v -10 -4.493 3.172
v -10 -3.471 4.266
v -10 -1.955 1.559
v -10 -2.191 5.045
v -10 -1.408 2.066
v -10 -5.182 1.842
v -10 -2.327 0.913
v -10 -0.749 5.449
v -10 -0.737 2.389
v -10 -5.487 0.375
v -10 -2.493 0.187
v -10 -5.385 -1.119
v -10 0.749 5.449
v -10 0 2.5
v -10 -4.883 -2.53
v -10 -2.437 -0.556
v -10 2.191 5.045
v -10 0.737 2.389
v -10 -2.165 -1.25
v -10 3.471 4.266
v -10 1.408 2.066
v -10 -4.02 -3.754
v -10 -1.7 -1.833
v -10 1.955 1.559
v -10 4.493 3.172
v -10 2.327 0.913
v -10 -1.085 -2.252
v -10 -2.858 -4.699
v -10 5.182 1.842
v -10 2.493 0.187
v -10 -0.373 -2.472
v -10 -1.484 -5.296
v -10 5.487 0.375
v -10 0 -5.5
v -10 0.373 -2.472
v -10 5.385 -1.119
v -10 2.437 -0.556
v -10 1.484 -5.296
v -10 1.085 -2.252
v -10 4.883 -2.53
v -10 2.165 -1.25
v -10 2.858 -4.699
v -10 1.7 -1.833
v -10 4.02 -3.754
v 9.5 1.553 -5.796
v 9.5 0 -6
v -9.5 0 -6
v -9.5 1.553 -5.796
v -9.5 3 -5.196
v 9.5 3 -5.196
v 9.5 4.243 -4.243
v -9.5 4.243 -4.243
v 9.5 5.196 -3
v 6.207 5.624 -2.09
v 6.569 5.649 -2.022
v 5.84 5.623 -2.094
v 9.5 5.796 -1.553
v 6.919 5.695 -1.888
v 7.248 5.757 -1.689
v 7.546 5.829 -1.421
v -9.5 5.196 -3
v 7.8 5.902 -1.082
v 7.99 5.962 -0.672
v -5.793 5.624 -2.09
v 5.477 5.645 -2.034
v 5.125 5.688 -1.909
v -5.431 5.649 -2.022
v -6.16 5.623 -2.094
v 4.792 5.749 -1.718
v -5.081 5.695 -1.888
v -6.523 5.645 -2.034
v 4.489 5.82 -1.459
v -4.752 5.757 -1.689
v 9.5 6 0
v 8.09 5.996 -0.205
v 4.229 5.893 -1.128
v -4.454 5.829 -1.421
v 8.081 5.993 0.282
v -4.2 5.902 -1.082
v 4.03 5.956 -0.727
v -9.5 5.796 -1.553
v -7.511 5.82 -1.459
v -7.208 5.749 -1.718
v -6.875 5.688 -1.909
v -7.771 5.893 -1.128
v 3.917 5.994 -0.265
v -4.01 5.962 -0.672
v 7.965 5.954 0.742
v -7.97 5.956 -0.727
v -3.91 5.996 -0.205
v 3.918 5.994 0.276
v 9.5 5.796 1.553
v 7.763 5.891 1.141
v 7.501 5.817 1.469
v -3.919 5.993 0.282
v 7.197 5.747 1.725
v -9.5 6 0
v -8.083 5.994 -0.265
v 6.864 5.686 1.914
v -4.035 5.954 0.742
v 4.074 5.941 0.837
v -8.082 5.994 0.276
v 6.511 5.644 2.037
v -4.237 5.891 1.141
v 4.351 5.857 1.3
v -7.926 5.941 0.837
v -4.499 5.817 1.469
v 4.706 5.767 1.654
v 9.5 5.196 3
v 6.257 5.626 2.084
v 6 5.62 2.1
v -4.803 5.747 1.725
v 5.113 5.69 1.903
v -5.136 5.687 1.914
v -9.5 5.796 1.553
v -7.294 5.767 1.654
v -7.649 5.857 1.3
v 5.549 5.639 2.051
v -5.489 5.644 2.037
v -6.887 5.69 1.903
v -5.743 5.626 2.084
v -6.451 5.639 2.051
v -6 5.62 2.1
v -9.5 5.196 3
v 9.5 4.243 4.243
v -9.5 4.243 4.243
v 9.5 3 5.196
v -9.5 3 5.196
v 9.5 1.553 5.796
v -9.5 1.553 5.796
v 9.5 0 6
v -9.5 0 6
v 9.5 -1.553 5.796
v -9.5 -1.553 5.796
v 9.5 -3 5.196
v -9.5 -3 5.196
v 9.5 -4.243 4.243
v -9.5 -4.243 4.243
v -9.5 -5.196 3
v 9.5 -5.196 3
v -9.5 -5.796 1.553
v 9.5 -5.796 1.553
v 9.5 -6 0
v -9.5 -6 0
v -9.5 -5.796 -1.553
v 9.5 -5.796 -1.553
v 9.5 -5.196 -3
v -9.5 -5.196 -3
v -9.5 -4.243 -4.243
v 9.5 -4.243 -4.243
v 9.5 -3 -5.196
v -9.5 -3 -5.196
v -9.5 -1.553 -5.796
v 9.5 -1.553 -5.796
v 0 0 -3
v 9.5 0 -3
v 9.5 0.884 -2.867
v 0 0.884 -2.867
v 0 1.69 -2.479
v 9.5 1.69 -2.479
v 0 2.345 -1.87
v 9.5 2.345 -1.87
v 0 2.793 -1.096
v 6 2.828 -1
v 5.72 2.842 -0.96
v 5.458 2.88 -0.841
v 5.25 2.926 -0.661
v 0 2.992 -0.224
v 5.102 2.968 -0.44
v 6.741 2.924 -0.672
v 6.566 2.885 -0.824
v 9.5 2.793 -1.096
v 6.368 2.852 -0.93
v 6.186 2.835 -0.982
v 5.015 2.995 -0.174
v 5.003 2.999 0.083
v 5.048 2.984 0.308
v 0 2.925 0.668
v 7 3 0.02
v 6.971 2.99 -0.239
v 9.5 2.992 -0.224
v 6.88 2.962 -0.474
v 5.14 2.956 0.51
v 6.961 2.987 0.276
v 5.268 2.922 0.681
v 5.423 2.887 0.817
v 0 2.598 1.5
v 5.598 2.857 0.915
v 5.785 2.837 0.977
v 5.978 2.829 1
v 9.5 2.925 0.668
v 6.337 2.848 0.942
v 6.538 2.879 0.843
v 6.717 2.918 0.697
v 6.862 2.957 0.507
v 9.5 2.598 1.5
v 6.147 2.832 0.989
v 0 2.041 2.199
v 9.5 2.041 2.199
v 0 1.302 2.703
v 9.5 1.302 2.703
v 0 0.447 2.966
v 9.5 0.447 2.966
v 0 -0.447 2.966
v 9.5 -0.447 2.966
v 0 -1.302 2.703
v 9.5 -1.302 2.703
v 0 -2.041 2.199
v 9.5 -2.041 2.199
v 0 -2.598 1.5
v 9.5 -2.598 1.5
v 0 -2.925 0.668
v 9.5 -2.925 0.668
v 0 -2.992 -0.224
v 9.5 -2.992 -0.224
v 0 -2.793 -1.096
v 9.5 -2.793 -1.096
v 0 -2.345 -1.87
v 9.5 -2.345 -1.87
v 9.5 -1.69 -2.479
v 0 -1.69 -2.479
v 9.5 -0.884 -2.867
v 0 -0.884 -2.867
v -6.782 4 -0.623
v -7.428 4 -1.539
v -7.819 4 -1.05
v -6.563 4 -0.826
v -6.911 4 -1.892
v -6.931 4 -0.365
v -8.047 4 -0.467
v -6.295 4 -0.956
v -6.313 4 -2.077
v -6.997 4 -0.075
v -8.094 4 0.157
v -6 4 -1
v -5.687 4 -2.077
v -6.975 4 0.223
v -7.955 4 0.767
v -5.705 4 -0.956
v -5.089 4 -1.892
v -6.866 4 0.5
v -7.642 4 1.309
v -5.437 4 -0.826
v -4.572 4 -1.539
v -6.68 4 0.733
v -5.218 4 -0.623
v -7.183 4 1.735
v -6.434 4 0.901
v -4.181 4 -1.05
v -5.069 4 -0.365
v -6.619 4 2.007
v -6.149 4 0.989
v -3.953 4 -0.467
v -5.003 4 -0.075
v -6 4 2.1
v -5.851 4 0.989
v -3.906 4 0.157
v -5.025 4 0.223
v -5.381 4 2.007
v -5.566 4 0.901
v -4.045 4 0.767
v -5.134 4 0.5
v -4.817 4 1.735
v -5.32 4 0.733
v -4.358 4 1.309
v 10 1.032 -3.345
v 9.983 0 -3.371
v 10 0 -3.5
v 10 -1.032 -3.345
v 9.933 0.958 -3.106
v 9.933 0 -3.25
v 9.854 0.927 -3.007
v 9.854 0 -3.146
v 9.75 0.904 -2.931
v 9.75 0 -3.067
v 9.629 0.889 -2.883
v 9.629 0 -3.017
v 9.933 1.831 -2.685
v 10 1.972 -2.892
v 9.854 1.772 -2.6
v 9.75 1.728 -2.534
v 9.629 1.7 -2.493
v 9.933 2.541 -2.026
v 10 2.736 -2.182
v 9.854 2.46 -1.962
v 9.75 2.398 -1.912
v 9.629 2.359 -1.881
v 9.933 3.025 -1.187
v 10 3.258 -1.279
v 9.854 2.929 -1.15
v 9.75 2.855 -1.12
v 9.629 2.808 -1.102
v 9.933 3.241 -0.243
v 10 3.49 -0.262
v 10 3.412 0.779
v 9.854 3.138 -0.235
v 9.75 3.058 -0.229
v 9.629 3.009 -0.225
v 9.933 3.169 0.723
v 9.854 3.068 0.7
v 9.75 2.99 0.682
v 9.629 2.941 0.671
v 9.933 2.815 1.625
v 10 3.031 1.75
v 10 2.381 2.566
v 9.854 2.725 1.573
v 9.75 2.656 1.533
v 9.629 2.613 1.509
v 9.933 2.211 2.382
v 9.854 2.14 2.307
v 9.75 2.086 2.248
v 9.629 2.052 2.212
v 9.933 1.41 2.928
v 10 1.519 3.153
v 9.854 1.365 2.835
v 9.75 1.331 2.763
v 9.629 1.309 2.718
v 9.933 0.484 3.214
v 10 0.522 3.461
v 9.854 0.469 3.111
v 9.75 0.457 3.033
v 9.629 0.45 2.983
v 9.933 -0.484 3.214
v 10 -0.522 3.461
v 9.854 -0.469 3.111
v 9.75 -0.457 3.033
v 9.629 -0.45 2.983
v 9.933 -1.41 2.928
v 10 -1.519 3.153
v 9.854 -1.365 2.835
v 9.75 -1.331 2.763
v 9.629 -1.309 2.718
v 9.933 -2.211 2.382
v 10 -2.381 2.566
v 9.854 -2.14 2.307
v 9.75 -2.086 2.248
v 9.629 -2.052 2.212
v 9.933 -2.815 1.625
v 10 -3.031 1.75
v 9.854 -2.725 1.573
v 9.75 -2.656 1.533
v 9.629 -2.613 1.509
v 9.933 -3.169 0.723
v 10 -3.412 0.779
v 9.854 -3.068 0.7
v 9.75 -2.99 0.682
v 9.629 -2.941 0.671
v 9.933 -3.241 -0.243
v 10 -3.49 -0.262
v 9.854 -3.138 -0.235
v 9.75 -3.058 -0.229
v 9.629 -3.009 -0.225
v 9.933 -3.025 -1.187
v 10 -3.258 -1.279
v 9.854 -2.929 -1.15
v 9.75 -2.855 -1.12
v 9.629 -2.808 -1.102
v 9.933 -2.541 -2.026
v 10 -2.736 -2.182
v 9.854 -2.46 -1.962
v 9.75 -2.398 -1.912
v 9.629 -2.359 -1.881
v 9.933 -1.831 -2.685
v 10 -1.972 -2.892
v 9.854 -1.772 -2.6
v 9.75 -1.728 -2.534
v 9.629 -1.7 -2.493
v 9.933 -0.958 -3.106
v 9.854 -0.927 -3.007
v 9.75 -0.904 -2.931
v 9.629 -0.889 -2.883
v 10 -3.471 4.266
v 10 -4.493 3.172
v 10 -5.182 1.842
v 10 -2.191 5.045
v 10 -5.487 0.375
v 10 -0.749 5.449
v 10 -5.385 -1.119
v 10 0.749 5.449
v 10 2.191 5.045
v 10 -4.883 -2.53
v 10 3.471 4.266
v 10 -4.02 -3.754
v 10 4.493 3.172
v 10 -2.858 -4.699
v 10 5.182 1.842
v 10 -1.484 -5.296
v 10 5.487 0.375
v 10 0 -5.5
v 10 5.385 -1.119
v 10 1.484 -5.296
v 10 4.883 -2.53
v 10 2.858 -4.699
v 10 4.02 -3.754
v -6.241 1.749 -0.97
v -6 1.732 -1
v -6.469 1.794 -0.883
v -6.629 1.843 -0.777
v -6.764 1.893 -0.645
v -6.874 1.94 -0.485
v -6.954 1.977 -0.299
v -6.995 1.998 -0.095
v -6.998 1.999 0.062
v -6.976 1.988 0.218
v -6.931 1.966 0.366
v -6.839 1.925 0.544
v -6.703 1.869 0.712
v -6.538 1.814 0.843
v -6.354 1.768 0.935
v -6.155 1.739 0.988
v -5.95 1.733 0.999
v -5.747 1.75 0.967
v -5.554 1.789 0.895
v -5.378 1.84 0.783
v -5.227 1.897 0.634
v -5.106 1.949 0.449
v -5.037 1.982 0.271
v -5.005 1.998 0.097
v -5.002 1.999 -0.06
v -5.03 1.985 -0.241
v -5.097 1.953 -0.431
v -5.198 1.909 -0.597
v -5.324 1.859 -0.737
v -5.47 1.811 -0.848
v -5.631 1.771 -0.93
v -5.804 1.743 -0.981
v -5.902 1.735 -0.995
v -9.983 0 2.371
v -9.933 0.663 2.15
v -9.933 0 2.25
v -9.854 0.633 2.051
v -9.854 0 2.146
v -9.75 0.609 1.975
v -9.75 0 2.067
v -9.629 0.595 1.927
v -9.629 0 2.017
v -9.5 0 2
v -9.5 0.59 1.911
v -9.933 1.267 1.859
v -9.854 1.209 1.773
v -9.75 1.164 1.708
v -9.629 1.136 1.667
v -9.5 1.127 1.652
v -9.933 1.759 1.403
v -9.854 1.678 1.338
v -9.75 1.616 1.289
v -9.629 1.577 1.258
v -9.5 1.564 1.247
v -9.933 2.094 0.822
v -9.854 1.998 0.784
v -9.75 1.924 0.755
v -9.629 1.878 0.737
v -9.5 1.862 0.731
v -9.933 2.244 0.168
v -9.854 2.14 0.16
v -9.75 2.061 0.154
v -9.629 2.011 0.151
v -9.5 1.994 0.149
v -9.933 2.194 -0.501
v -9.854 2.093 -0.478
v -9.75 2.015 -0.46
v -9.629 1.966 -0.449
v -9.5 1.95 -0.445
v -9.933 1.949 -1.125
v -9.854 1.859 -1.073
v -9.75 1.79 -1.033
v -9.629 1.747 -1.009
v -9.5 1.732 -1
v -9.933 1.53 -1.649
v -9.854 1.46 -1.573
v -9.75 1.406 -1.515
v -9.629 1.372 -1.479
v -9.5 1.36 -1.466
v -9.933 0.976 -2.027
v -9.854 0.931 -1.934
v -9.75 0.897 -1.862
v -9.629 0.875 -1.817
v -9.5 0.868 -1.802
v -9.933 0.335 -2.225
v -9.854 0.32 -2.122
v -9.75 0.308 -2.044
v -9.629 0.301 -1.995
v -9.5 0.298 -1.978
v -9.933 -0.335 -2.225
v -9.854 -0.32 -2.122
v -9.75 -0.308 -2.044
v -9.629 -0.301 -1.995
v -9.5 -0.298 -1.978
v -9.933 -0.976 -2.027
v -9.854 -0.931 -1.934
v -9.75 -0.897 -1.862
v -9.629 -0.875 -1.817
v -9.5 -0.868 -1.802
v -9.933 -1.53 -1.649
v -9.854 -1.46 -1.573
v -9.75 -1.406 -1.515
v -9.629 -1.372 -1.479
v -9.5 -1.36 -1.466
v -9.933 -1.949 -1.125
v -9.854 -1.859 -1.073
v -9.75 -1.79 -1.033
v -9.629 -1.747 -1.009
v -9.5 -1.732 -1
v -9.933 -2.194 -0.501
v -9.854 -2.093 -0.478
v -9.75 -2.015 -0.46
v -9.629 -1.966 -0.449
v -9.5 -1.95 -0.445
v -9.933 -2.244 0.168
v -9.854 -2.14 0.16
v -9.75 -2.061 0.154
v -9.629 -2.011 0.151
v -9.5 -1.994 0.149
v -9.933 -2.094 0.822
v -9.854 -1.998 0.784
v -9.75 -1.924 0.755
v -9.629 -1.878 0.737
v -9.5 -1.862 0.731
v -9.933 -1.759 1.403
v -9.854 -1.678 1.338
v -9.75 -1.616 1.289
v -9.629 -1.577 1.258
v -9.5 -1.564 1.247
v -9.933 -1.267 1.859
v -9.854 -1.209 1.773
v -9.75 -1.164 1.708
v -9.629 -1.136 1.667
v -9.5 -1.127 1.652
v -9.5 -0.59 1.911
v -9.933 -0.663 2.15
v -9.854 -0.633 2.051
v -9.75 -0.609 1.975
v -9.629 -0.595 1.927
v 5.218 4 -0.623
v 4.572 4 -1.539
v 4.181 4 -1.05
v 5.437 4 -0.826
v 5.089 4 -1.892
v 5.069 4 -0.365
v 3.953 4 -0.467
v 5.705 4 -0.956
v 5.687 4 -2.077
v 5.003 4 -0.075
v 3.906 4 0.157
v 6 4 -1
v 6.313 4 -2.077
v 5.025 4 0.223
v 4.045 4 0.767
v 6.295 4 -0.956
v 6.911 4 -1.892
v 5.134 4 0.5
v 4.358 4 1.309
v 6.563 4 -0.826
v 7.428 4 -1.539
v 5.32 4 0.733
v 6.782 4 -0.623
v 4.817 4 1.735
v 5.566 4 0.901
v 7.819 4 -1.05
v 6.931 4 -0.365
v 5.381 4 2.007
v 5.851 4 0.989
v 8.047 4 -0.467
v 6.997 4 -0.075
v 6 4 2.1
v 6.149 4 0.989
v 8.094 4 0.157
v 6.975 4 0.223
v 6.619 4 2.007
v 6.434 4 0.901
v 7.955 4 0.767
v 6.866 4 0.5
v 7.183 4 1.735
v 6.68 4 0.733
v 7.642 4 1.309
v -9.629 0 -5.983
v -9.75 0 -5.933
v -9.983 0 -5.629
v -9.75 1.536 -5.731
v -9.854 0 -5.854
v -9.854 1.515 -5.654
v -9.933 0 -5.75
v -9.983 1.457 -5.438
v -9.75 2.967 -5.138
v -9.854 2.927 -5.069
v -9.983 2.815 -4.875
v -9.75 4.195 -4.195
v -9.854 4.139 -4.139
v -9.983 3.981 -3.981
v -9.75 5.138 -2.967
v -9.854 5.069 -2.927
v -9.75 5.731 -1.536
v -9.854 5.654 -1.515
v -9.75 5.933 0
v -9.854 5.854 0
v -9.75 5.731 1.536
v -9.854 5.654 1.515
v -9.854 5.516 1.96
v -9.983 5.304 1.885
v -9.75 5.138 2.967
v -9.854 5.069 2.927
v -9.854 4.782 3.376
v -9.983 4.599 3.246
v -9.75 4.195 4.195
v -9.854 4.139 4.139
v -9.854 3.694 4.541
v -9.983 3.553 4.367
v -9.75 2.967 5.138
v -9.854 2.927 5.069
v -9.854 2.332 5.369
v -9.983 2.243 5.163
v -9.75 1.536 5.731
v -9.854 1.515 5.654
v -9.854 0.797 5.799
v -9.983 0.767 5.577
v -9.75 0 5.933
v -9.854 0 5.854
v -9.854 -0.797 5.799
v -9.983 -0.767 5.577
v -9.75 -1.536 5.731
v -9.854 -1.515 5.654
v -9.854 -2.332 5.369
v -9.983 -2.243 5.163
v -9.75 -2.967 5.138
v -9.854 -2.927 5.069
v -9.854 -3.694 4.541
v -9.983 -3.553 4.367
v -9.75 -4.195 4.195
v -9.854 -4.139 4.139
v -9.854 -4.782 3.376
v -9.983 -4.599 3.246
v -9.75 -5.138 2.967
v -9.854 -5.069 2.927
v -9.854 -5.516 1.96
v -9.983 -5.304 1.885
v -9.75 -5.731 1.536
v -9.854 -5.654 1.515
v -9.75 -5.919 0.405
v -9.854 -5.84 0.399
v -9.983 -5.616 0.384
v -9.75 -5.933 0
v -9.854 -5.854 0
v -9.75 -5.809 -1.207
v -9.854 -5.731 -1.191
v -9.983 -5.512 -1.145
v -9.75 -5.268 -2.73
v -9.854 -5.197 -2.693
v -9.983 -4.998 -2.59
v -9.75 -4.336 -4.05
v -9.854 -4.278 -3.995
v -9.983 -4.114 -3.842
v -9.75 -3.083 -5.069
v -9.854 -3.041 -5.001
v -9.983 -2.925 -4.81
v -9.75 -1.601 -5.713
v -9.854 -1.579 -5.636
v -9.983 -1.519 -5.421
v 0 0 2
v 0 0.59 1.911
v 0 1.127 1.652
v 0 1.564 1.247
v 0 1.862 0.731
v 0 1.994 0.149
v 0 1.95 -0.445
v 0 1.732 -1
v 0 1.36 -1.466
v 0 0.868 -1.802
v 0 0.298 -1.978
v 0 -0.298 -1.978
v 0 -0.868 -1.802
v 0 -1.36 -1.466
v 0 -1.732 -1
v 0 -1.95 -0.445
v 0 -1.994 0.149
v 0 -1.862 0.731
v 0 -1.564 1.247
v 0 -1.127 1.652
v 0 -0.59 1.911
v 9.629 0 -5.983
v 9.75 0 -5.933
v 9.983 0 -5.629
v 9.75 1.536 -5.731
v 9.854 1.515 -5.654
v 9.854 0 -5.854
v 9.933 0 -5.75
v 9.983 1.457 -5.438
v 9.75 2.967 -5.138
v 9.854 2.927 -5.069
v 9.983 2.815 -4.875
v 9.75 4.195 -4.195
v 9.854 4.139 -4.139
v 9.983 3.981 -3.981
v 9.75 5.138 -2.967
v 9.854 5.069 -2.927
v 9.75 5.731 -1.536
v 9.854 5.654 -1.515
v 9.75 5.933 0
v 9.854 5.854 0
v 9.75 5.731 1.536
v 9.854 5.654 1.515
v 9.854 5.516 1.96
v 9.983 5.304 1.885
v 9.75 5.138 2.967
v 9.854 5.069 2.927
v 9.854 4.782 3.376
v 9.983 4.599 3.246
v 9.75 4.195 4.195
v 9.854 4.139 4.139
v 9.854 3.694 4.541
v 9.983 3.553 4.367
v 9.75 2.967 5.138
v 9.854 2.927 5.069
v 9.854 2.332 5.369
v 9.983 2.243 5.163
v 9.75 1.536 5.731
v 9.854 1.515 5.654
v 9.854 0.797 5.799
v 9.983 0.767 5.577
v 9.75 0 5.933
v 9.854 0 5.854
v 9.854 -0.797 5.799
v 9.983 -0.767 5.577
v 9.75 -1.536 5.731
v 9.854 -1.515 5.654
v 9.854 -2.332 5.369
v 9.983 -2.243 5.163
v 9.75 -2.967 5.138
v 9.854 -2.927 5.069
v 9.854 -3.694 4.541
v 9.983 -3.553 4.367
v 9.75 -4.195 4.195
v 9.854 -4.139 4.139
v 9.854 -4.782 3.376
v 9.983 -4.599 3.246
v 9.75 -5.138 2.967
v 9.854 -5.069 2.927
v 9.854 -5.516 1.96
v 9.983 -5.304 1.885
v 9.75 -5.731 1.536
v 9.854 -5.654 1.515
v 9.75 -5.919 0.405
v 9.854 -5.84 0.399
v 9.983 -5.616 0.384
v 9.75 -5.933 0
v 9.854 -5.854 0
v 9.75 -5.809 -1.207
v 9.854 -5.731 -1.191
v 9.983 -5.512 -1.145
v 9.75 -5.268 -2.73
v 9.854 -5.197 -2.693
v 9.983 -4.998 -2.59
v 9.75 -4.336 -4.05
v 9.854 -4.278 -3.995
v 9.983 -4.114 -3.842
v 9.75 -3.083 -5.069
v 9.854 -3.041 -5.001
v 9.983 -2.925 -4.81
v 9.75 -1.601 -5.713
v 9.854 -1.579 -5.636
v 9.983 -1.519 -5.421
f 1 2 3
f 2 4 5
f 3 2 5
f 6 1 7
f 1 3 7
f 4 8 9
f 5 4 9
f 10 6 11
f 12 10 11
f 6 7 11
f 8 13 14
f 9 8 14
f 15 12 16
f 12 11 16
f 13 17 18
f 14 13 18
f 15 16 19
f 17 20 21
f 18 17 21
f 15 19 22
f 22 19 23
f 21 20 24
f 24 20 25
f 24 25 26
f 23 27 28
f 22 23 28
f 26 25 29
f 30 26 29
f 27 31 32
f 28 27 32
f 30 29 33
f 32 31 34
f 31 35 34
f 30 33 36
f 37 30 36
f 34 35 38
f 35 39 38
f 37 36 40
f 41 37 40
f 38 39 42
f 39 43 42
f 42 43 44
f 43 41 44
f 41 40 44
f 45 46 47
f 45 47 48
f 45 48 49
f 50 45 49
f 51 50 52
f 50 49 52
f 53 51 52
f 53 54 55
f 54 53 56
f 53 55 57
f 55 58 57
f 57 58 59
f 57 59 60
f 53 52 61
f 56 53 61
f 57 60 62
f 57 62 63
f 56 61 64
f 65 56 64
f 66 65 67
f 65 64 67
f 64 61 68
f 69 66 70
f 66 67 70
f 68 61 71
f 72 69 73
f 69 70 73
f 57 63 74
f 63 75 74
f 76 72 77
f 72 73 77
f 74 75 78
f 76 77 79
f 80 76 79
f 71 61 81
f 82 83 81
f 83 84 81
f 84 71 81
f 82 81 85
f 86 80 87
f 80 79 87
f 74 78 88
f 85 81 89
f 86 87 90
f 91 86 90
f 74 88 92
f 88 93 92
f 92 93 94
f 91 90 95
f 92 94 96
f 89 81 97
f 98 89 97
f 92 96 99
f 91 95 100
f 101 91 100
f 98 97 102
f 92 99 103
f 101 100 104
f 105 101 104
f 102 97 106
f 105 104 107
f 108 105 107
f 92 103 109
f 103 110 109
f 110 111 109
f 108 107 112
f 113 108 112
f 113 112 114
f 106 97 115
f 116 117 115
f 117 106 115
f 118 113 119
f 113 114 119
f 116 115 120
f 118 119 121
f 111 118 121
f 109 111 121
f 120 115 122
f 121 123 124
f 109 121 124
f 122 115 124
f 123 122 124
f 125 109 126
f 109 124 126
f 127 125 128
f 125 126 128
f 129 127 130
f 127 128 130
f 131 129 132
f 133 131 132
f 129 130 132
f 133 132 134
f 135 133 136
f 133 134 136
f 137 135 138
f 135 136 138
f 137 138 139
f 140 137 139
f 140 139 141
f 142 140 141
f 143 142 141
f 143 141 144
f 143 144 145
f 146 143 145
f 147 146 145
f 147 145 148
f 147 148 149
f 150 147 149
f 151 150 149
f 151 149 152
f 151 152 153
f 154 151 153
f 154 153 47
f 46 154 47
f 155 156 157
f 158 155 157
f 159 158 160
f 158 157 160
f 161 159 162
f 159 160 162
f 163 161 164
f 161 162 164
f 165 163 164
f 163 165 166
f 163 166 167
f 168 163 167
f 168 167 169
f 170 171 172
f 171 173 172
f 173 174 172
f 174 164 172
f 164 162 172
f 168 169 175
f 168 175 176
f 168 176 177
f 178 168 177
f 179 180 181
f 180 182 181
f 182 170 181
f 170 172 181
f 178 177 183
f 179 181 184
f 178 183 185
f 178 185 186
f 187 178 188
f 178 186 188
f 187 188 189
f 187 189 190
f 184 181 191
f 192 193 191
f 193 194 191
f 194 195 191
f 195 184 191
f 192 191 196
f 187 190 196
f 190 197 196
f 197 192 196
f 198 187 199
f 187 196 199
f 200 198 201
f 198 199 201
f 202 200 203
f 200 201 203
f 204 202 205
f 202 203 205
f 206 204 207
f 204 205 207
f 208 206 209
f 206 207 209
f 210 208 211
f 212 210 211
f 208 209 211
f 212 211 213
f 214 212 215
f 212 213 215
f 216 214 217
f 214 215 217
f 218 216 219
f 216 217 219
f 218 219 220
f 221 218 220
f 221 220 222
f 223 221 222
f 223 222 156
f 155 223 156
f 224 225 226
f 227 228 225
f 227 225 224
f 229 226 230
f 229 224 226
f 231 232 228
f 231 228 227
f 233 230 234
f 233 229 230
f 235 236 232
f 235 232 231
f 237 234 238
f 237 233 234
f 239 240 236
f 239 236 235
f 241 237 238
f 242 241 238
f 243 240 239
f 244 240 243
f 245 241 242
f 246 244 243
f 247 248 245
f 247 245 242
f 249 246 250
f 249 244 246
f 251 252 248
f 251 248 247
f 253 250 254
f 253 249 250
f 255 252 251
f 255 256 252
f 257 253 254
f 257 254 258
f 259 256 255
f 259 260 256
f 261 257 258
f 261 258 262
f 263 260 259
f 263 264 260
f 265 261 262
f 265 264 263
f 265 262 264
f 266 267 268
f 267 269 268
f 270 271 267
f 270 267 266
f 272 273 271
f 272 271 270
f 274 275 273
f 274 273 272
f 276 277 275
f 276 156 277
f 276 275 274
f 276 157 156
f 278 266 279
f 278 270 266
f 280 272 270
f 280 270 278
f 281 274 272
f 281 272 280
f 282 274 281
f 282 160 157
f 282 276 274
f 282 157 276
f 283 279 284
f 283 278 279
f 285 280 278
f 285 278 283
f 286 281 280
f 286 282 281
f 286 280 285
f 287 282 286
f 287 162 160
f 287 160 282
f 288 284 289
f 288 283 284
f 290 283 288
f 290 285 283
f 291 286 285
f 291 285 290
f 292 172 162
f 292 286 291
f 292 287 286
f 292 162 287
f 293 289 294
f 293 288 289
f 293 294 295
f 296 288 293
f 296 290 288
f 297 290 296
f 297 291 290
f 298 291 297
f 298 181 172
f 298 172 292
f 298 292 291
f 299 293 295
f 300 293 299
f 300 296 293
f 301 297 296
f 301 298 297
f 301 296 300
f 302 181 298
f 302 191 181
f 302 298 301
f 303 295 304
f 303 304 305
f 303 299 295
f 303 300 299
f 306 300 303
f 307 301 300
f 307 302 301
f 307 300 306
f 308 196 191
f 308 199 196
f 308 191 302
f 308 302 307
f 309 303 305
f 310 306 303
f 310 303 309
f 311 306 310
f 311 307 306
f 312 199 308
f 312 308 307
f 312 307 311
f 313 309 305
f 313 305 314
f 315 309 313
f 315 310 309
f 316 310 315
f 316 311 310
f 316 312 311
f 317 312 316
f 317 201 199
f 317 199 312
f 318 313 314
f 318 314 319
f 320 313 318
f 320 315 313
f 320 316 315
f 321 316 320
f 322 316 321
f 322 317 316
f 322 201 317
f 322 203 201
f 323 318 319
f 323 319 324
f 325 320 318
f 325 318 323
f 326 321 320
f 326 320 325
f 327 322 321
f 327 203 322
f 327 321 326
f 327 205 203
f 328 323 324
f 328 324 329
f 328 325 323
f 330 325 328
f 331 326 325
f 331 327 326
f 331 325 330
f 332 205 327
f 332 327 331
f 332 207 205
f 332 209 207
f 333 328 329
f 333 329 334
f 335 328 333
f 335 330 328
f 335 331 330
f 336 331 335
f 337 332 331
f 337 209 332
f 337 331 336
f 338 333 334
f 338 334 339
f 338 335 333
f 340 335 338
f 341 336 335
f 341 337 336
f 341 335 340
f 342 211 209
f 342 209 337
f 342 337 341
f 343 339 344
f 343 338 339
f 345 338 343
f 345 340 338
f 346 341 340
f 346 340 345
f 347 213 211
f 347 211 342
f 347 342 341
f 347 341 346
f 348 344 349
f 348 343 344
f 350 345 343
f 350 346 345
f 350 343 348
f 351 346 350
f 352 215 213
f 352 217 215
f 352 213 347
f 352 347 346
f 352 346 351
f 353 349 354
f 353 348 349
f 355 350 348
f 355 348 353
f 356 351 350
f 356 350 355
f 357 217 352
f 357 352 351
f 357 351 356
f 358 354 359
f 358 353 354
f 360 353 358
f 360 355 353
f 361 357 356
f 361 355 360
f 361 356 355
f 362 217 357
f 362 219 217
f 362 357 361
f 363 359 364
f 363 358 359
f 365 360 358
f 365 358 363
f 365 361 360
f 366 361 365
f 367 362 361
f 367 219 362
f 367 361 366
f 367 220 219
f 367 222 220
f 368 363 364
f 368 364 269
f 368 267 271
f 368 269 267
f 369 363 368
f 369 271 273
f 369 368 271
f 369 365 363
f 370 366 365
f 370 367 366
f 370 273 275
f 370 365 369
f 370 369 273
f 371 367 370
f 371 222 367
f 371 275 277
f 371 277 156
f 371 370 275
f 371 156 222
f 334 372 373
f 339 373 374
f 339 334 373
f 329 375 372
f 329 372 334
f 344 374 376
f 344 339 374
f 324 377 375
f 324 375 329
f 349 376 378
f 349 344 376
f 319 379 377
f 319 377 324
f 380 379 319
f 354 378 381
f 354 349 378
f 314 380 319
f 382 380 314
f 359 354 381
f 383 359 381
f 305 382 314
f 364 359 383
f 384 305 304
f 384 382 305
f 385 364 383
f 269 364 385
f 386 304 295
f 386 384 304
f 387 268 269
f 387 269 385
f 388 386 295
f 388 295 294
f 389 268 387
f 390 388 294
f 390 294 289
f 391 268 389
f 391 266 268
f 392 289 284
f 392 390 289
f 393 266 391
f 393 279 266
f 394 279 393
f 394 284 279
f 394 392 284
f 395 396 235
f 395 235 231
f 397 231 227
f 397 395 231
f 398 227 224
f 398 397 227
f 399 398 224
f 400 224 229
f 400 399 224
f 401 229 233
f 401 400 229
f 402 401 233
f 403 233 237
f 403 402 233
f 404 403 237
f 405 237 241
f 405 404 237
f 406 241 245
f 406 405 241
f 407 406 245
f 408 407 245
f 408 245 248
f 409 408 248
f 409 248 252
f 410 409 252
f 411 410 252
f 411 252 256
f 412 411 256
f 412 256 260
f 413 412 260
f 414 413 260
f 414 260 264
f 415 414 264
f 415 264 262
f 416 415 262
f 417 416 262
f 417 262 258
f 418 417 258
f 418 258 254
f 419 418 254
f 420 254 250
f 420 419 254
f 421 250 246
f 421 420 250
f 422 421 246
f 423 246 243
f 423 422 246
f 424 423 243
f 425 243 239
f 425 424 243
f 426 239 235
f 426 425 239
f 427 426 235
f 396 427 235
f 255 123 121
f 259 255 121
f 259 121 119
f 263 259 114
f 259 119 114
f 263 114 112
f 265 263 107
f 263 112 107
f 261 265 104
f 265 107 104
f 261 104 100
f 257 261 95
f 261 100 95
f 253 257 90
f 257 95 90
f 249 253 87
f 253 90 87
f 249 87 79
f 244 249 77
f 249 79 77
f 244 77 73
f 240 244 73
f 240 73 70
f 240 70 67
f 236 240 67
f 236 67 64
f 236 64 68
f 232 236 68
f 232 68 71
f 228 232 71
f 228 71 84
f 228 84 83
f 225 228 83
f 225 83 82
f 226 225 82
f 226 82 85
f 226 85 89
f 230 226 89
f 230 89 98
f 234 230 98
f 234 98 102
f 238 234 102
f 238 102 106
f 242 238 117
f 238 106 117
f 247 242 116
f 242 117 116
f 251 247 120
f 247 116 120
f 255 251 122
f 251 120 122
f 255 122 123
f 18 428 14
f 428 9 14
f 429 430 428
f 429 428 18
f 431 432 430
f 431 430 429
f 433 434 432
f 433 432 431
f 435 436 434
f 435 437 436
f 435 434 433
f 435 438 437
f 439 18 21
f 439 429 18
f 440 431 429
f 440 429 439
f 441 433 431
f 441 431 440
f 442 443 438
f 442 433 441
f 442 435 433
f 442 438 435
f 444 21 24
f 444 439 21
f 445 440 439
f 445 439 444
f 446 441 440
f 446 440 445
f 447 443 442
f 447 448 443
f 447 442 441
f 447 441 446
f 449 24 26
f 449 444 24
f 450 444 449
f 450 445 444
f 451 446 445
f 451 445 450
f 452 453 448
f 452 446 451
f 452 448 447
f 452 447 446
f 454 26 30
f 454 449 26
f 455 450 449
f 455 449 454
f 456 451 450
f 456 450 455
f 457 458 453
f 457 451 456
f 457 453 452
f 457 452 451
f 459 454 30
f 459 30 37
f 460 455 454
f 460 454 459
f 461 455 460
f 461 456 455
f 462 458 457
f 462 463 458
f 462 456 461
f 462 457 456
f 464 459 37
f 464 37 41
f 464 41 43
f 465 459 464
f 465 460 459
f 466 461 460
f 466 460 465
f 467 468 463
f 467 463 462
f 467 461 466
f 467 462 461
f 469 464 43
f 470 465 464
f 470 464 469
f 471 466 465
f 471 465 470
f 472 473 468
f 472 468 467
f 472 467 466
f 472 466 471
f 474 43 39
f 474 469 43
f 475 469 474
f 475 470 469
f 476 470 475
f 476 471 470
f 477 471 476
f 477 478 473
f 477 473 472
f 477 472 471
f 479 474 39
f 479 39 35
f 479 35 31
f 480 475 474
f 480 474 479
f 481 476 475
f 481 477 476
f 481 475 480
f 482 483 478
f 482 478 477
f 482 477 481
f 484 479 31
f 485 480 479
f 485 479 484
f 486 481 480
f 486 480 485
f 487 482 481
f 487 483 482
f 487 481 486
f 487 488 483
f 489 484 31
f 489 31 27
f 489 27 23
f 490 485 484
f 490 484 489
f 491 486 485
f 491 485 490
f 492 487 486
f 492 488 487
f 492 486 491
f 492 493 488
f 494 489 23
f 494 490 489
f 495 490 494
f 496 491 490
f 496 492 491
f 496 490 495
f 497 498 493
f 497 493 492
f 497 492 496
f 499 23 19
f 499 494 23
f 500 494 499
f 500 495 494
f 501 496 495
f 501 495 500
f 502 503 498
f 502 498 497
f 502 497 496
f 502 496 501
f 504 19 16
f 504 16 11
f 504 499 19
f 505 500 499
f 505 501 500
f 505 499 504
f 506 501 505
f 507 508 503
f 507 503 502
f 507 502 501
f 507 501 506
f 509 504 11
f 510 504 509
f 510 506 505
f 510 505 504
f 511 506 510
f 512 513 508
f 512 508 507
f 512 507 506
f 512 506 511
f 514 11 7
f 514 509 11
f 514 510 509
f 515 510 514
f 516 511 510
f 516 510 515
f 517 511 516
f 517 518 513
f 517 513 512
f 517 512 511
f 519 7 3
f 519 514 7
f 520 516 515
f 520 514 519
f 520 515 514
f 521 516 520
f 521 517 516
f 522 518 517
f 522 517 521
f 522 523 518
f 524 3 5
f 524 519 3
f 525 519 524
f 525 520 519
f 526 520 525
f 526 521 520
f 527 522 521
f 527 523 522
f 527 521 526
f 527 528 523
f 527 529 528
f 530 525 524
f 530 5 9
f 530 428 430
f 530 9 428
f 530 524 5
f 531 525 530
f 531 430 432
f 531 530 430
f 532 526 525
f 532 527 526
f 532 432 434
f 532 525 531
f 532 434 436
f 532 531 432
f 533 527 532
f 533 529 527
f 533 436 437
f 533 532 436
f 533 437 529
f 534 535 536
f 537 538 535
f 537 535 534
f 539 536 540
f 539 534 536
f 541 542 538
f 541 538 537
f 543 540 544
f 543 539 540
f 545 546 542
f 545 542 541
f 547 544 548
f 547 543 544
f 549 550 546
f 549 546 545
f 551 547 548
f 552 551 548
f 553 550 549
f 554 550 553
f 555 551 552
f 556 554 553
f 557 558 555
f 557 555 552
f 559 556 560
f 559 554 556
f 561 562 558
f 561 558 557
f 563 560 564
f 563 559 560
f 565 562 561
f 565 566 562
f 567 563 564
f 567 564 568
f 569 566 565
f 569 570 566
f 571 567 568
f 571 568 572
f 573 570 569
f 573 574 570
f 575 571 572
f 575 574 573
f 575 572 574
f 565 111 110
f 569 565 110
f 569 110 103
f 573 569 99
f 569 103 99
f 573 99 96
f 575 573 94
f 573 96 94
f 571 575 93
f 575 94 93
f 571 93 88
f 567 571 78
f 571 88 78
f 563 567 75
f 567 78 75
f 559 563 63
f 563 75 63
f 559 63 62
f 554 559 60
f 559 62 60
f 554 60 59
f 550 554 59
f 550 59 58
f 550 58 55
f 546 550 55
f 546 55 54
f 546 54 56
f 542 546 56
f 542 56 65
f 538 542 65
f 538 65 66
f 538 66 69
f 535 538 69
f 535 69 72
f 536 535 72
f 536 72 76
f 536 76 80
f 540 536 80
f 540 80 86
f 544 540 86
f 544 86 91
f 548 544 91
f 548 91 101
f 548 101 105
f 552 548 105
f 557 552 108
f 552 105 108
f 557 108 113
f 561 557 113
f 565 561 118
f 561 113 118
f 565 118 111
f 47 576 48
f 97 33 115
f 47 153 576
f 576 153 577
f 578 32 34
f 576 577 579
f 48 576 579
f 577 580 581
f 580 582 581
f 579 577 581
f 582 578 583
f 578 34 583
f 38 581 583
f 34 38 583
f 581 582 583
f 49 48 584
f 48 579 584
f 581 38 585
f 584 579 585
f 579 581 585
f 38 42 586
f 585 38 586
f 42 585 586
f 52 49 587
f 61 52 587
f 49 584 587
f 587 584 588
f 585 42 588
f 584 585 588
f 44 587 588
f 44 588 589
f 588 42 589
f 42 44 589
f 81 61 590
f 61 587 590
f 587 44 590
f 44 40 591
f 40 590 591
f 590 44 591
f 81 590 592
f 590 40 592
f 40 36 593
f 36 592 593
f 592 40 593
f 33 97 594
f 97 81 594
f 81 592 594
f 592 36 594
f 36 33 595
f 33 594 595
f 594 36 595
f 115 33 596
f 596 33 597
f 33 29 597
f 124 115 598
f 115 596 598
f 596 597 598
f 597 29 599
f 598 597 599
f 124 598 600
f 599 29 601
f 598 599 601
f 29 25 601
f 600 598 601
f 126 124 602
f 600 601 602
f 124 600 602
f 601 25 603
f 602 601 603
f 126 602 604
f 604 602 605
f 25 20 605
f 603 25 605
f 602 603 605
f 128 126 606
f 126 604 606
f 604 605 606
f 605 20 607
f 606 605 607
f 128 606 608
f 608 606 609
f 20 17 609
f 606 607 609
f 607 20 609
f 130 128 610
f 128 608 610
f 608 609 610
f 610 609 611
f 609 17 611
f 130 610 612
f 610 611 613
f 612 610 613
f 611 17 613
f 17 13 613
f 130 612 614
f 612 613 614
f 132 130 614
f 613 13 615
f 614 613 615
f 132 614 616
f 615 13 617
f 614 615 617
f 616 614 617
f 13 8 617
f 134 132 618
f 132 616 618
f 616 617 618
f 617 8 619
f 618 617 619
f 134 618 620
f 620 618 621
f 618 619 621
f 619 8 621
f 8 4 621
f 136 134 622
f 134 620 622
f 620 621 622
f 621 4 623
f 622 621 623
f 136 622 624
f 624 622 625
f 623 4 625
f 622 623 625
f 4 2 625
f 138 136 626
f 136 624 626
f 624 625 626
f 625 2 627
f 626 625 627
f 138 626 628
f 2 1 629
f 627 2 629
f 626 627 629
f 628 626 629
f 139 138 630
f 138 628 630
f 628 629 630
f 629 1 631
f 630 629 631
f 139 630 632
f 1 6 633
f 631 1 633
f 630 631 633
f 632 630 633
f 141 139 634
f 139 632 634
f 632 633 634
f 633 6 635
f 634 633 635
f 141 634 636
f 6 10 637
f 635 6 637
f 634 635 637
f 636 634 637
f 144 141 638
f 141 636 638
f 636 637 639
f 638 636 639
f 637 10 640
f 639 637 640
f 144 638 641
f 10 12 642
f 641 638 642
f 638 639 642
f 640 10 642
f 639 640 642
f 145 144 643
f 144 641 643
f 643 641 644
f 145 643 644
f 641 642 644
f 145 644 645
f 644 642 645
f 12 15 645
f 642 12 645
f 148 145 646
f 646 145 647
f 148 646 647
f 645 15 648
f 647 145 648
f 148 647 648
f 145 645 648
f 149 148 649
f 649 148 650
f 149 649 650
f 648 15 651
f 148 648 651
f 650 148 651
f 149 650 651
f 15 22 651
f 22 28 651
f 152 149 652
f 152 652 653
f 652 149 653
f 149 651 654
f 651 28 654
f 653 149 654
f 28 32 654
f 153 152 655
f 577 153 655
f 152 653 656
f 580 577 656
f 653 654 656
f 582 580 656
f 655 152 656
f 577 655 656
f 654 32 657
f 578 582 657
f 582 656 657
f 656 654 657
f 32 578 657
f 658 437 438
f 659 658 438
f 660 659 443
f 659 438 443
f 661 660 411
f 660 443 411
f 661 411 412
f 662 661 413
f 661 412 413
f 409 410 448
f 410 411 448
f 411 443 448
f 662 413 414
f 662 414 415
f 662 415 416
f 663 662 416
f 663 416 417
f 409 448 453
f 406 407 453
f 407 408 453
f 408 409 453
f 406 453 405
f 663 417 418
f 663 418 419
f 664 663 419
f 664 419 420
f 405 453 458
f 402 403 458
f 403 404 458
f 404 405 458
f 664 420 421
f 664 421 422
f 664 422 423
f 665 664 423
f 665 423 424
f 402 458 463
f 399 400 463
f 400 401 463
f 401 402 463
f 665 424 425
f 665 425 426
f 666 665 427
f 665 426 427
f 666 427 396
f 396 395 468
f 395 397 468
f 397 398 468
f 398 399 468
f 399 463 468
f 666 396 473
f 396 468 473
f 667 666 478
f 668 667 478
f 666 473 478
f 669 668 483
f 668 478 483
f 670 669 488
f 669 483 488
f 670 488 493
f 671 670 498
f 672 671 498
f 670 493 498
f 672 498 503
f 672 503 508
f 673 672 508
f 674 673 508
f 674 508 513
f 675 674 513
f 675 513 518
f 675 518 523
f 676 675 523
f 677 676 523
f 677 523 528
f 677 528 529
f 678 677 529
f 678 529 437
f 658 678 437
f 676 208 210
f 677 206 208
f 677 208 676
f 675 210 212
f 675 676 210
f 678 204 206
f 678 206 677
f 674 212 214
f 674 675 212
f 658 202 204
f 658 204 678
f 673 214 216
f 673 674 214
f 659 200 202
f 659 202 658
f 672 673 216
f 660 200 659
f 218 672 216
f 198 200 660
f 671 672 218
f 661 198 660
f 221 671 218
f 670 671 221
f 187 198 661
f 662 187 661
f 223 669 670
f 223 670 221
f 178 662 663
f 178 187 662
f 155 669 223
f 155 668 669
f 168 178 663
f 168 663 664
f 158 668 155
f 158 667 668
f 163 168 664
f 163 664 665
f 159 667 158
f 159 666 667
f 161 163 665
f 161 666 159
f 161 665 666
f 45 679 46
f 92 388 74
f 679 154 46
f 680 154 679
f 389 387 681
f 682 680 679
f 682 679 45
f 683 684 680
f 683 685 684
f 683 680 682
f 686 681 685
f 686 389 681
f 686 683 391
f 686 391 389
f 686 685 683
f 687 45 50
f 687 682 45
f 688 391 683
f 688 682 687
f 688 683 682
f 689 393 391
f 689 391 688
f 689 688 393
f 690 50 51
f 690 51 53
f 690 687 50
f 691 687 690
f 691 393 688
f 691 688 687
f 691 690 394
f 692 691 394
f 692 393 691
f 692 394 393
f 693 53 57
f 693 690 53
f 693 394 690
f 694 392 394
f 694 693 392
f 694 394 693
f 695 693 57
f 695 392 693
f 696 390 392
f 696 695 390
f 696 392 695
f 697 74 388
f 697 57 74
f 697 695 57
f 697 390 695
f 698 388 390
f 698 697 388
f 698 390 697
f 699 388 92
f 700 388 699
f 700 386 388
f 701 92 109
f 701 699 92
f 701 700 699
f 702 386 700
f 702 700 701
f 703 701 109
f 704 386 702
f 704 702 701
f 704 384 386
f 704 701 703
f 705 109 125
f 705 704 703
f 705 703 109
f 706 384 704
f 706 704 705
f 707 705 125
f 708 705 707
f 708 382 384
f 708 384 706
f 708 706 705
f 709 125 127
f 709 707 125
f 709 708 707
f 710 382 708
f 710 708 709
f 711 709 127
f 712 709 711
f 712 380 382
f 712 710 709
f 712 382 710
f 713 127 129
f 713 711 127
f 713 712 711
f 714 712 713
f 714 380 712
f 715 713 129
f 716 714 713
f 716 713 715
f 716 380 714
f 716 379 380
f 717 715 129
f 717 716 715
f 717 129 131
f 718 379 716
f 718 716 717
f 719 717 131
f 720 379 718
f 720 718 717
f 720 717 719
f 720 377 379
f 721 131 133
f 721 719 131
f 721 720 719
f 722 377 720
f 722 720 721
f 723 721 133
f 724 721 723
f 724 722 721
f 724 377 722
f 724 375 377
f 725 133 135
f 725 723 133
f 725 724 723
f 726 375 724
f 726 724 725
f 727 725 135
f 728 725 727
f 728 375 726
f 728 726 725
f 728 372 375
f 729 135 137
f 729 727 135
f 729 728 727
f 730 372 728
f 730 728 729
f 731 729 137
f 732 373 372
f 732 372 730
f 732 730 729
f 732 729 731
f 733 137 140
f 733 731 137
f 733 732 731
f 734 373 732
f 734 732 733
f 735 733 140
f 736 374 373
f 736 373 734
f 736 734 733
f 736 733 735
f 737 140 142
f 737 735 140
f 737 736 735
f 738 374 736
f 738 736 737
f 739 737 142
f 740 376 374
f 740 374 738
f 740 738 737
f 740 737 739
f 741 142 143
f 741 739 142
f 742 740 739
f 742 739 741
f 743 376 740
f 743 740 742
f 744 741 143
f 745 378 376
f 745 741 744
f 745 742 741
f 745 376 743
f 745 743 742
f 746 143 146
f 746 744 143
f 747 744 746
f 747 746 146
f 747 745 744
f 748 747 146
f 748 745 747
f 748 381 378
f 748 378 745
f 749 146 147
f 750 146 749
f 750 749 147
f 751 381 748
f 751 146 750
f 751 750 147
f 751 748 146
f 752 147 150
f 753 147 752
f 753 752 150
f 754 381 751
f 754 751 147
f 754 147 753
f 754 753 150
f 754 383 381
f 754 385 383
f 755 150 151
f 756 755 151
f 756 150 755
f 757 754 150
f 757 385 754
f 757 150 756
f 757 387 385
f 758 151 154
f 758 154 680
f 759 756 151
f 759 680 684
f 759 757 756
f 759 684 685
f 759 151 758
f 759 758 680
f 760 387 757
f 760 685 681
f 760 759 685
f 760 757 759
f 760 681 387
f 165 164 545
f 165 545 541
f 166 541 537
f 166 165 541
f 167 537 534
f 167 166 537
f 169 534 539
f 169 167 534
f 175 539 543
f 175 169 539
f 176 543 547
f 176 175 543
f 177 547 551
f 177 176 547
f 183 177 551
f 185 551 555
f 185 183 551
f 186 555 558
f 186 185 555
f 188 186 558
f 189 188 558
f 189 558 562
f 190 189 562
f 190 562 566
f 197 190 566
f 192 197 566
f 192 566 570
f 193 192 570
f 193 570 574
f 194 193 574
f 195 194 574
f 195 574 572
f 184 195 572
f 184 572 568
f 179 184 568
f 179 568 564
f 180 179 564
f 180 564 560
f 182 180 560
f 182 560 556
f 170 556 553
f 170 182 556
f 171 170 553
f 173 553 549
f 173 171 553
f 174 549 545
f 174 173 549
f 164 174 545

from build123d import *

# Parameters (mm, degrees)
BOSS_EXTRUDE1_DEPTH      = 10
BOSS_EXTRUDE1_DEPTH_BACK = 10
SKETCH1_R                = 6
SKETCH2_R                = 3
CUT_EXTRUDE1_DEPTH       = 10
SKETCH3_R                = 2
CUT_EXTRUDE2_DEPTH       = 10
CUT_EXTRUDE4_REACH       = 15.115
CUT_EXTRUDE4_END_RADIUS  = 6
SKETCH4_R                = 1
FILLET1_R                = 0.5
SKETCH5_R                = 2.1
CUT_EXTRUDE7_DEPTH       = 2


with BuildPart() as part:
    # Sketch1 → Boss-Extrude1 (new, two sides: drawn at the far end of the back side and taken through both)
    with BuildSketch(Plane(origin=(0, 0, 0), x_dir=(0, 0, -1), z_dir=(1, 0, 0)).offset(-BOSS_EXTRUDE1_DEPTH_BACK)):
        Circle(SKETCH1_R)
    extrude(amount=BOSS_EXTRUDE1_DEPTH + BOSS_EXTRUDE1_DEPTH_BACK)

    # Sketch2 → Cut-Extrude1 (cut)
    with BuildSketch(Plane(origin=(10, 0, 0), x_dir=(0, 0, -1), z_dir=(1, 0, 0))):
        Circle(SKETCH2_R)
    extrude(amount=-CUT_EXTRUDE1_DEPTH, mode=Mode.SUBTRACT)

    # Sketch3 → Cut-Extrude2 (cut)
    with BuildSketch(Plane.ZY.offset(10)):
        Circle(SKETCH3_R)
    extrude(amount=-CUT_EXTRUDE2_DEPTH, mode=Mode.SUBTRACT)

    # Cut-Extrude4: up to this cylinder (the profile starts inside it)
    cut_extrude4_end = Plane(origin=(0, 0, 0), z_dir=(1, 0, 0)) * Cylinder(CUT_EXTRUDE4_END_RADIUS, 55.23, mode=Mode.PRIVATE)
    # Sketch4 → Cut-Extrude4 (cut, up to the surface)
    with BuildSketch(Plane(origin=(0, 0, 0), x_dir=(1, 0, 0), z_dir=(0, 1, 0)), mode=Mode.PRIVATE) as cut_extrude4_sk1:
        with Locations(Location((-6, 0, 0), (0, 0, 90))):
            Circle(SKETCH4_R)
    cut_extrude4_tool1 = extrude(cut_extrude4_sk1.sketch, amount=CUT_EXTRUDE4_REACH, mode=Mode.PRIVATE) & cut_extrude4_end
    add(cut_extrude4_tool1.solids().sort_by_distance((-6, 0, 0))[0], mode=Mode.SUBTRACT)
    # Sketch4 → Cut-Extrude4 (cut, up to the surface)
    with BuildSketch(Plane(origin=(0, 0, 0), x_dir=(1, 0, 0), z_dir=(0, 1, 0)), mode=Mode.PRIVATE) as cut_extrude4_sk2:
        with Locations(Location((6, 0, 0), (0, 0, 90))):
            Circle(SKETCH4_R)
    cut_extrude4_tool2 = extrude(cut_extrude4_sk2.sketch, amount=CUT_EXTRUDE4_REACH, mode=Mode.PRIVATE) & cut_extrude4_end
    add(cut_extrude4_tool2.solids().sort_by_distance((6, 0, 0))[0], mode=Mode.SUBTRACT)

    # Fillet1
    fillet1_edges = [part.edges().sort_by_distance(p)[0] for p in [
        (-10, 0, -2),
        (-10, 0, 6),
        (10, 0, 6),
        (10, 0, 3),
    ]]
    fillet(fillet1_edges, radius=FILLET1_R)

    # Sketch5 → Cut-Extrude7 (cut)
    with BuildSketch(Plane(origin=(0, 6, 0), x_dir=(1, 0, 0), z_dir=(0, 1, 0))):
        with Locations(Location((-6, 0, 0), (0, 0, 270))):
            Circle(SKETCH5_R)
        with Locations(Location((6, 0, 0), (0, 0, 270))):
            Circle(SKETCH5_R)
    extrude(amount=-CUT_EXTRUDE7_DEPTH, mode=Mode.SUBTRACT)


solid = part.part
